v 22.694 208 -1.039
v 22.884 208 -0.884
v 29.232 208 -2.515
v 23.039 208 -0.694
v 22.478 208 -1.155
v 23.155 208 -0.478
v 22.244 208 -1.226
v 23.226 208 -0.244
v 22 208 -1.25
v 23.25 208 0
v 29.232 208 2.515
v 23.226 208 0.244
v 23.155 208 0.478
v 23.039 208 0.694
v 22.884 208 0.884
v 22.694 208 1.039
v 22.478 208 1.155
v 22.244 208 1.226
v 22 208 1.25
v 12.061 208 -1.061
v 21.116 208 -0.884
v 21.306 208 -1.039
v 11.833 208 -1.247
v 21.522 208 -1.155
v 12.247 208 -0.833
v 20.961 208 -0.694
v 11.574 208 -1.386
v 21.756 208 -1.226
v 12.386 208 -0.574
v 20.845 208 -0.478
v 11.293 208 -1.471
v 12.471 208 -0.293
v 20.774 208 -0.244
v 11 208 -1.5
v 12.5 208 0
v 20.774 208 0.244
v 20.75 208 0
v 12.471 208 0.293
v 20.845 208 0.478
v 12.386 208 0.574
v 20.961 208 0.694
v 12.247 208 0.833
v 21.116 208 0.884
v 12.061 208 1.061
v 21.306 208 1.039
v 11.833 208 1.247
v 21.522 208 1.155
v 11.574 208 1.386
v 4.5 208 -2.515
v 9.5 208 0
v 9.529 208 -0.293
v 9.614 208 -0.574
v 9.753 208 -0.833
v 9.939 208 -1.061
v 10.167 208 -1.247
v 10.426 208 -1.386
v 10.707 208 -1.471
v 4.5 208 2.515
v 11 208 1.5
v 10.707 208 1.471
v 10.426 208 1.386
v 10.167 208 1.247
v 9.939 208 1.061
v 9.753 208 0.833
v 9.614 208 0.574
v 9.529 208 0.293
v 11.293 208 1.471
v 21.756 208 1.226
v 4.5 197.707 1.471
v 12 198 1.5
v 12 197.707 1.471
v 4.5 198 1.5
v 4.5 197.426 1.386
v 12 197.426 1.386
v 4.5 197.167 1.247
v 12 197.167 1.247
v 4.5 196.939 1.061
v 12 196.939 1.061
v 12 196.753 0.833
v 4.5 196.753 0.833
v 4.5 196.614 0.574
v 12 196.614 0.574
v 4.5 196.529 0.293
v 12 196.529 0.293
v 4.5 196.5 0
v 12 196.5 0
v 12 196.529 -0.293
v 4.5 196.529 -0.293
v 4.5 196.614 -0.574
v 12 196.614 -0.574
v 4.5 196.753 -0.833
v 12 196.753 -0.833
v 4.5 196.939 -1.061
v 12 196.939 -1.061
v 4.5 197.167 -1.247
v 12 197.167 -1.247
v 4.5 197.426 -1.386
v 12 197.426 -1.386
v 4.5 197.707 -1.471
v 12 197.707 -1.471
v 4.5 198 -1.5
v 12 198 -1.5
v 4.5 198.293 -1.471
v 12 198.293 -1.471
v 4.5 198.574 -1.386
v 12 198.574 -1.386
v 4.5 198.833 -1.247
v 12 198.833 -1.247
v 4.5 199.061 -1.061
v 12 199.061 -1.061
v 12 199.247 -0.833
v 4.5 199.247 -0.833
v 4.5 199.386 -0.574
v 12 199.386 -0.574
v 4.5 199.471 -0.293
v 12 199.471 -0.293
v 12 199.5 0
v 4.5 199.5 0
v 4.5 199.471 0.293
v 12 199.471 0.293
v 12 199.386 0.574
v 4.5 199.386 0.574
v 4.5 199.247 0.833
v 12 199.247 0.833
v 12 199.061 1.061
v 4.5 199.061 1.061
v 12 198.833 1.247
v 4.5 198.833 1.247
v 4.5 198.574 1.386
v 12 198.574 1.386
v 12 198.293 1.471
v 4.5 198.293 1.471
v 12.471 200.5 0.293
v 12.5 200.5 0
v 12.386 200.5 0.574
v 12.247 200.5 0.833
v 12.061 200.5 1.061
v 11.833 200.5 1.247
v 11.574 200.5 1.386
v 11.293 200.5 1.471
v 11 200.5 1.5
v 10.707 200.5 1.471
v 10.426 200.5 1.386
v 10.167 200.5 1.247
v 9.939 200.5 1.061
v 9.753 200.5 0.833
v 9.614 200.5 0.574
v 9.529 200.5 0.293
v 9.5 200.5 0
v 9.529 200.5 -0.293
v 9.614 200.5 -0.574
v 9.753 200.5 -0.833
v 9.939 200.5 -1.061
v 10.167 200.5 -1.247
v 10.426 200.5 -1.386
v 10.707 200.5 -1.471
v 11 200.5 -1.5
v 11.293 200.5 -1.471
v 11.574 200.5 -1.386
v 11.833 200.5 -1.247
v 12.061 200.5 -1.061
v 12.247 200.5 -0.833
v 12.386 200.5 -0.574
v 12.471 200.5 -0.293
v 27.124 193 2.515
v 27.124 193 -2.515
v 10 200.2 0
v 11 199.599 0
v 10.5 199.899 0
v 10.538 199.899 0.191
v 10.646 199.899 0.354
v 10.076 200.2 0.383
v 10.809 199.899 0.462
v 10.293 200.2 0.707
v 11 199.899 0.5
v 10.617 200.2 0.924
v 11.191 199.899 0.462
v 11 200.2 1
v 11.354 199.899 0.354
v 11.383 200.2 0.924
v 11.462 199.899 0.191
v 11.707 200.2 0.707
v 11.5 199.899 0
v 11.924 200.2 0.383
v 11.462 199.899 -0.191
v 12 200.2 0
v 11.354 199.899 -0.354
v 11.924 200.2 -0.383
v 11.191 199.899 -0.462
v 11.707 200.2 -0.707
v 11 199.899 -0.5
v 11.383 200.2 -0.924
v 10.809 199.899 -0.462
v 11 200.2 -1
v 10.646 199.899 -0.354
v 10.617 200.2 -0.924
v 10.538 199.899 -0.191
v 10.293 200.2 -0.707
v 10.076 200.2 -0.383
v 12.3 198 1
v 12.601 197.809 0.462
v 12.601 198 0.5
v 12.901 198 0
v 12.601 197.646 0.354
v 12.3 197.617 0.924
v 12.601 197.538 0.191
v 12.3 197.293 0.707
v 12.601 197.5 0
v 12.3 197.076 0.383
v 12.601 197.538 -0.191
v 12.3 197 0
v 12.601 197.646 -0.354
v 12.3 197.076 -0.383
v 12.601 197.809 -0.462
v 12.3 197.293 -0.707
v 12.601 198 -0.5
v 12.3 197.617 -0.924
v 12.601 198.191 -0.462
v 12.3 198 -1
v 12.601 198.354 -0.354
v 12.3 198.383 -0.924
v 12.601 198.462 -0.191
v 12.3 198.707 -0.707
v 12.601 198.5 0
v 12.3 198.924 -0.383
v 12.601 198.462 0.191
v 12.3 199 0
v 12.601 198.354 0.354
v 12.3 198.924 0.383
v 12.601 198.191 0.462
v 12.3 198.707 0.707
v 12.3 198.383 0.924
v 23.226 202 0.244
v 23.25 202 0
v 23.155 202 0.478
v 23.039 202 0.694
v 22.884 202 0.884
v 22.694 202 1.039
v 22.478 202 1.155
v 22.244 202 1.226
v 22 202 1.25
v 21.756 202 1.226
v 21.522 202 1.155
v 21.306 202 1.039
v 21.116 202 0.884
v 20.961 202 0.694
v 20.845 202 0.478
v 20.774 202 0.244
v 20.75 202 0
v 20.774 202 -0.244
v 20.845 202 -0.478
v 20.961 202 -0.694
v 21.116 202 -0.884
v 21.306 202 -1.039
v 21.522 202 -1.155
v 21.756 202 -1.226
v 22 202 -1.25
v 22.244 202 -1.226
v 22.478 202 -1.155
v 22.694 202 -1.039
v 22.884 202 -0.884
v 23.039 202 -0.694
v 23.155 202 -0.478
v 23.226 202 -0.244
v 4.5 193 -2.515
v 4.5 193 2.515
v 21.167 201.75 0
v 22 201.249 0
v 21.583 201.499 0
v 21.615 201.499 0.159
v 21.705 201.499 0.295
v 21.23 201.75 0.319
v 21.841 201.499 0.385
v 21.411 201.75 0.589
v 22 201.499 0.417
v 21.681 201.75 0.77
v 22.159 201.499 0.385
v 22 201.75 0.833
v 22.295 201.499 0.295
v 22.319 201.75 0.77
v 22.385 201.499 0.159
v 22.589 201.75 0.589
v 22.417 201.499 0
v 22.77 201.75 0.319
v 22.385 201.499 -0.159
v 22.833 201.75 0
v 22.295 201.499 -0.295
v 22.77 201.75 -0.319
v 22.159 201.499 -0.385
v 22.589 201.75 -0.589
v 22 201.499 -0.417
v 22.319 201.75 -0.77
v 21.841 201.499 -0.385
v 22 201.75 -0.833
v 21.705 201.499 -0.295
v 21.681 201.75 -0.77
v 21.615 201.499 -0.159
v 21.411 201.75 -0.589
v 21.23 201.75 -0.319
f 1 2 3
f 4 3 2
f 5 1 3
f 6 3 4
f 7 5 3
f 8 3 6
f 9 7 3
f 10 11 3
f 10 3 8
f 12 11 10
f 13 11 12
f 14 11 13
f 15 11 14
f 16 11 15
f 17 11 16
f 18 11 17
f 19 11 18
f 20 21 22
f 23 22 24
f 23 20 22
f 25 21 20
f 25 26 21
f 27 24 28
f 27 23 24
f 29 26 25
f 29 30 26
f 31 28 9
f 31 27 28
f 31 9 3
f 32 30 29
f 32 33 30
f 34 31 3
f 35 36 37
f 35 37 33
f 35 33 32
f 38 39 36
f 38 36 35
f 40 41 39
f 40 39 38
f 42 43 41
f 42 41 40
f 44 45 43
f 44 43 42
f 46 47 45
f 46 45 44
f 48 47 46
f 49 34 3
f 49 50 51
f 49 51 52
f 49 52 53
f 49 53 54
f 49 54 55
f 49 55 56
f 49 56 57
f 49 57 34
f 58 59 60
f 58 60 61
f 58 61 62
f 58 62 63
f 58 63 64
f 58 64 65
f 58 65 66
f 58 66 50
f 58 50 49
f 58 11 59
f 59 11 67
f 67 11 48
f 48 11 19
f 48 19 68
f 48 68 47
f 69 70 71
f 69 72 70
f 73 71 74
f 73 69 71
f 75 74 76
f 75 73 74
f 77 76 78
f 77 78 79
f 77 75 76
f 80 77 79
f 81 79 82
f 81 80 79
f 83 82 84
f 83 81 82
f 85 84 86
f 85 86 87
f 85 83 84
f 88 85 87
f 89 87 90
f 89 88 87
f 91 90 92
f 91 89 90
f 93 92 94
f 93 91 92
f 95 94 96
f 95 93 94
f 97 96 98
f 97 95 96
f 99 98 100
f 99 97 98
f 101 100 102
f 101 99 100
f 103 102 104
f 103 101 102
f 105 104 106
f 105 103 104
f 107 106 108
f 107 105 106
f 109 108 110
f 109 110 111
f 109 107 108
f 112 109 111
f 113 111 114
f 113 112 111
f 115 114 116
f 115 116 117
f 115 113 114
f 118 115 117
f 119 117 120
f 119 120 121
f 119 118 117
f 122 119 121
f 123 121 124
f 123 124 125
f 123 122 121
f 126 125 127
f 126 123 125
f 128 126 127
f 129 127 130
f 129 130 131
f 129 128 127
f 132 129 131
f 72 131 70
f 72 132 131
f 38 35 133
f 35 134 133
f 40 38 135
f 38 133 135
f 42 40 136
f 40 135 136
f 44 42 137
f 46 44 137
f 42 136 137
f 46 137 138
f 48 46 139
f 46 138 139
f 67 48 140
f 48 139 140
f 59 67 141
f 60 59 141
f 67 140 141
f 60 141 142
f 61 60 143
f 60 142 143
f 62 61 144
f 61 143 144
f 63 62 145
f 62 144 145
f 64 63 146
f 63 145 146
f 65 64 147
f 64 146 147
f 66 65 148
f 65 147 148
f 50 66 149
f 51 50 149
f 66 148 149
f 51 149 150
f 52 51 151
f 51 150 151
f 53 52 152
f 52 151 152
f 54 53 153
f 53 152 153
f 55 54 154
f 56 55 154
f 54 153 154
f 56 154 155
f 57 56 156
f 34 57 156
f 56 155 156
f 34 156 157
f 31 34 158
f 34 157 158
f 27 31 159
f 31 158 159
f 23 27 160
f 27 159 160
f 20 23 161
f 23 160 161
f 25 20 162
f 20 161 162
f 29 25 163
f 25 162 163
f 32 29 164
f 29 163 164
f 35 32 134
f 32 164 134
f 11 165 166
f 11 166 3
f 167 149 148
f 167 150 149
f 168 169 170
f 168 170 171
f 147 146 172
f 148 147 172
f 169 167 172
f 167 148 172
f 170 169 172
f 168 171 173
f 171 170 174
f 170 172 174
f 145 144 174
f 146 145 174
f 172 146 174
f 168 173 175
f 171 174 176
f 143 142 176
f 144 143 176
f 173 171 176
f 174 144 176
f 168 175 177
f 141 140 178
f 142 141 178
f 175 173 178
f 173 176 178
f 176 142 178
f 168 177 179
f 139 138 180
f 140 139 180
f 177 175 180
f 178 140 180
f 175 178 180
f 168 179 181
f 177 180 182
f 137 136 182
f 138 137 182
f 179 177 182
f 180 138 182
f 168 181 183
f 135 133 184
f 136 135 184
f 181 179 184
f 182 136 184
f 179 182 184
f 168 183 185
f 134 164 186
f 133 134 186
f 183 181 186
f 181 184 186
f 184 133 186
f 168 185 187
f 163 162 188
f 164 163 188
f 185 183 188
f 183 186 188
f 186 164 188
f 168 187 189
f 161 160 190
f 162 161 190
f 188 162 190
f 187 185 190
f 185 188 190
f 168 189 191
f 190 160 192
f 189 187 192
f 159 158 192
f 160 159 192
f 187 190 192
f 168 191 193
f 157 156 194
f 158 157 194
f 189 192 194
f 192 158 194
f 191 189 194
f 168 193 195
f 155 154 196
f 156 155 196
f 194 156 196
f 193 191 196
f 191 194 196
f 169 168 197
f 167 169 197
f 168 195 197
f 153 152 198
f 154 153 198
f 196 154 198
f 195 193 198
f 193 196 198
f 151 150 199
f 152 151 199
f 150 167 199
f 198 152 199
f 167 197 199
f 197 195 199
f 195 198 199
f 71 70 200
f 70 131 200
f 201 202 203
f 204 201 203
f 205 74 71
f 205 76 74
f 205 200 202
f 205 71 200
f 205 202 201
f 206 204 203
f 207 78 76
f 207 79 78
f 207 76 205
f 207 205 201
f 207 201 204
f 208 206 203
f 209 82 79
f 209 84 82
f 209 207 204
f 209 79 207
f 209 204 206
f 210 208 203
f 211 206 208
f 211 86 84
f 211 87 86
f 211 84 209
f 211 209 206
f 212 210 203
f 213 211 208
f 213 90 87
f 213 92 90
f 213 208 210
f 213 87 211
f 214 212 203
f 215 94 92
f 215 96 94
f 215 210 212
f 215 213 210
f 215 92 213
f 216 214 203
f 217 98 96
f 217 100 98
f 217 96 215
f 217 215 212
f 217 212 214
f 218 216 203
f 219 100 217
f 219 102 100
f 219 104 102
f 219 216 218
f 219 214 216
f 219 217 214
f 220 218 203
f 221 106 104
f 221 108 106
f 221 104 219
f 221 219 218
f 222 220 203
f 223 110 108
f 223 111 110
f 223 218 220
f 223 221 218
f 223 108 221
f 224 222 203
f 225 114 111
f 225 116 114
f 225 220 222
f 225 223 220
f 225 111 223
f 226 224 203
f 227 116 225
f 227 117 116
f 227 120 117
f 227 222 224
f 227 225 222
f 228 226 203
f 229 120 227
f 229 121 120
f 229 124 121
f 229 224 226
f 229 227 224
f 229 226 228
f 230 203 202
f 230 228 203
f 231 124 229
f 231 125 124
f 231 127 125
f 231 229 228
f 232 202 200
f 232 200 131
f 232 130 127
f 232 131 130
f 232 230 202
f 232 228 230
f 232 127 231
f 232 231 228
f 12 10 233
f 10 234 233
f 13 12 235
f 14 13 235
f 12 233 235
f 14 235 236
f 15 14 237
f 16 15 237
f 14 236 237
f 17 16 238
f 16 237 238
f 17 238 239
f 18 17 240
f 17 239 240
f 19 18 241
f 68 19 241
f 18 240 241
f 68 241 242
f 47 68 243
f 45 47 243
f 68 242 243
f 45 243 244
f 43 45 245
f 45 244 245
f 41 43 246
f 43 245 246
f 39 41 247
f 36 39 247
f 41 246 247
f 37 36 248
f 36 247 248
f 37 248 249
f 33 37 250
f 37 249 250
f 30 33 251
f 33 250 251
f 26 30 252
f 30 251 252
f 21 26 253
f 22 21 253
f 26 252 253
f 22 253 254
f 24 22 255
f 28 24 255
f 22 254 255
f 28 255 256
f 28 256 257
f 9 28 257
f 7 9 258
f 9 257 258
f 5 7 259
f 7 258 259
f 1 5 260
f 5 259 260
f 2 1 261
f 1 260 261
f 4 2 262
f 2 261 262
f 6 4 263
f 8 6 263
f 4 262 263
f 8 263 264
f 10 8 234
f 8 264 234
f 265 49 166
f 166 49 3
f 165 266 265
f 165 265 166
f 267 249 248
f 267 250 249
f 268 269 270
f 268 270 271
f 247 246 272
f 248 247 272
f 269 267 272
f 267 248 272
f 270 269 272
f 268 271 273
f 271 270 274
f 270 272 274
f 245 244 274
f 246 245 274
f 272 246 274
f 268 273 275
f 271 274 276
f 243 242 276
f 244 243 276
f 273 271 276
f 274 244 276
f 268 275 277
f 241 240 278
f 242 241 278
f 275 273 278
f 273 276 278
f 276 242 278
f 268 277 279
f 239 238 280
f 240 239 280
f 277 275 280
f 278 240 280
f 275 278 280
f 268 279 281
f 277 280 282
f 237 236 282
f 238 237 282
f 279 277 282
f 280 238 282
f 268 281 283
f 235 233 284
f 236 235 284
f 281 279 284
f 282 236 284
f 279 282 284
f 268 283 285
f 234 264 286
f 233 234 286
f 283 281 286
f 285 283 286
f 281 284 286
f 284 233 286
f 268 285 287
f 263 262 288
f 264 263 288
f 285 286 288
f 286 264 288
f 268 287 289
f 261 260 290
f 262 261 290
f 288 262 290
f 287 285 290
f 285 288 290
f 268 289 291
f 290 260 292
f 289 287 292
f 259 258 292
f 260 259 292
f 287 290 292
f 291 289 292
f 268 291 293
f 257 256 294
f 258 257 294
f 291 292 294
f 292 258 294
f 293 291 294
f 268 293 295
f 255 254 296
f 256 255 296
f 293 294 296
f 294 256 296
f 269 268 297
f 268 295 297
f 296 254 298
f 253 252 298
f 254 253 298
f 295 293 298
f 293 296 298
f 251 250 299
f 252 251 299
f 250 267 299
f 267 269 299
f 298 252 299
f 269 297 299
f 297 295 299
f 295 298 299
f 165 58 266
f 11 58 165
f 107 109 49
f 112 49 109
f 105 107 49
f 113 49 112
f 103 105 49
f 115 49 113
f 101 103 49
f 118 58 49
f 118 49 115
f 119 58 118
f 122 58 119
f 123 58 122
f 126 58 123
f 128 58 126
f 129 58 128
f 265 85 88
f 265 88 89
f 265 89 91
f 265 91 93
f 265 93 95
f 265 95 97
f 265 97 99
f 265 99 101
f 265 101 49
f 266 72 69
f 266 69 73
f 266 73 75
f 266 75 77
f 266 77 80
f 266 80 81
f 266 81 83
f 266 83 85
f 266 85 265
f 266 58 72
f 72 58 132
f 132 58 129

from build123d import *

# Parameters (mm, degrees)
EXTRUDE1_DEPTH                 = 2.515
M3X0_5_TAPPED_HOLE2_AT_2_COUNT = 2
M3X0_5_TAPPED_HOLE2_AT_2_PITCH = 37
M3X0_5_TAPPED_HOLE2_AT_3_COUNT = 2
M3X0_5_TAPPED_HOLE2_AT_3_PITCH = 74
M3X0_5_TAPPED_HOLE2_AT_4_COUNT = 2
M3X0_5_TAPPED_HOLE2_AT_4_PITCH = 111
M3X0_5_TAPPED_HOLE2_AT_5_COUNT = 2
M3X0_5_TAPPED_HOLE2_AT_5_PITCH = 148
CUT_EXTRUDE1_DEPTH             = 6.03
M3X0_5_TAPPED_HOLE1_D          = 3
M3X0_5_TAPPED_HOLE1_DEPTH      = 7.5
M3X0_5_TAPPED_HOLE1_TIP        = 0.901290929
F_2_5_2_5_DIAMETER_HOLE1_D     = 2.5
F_2_5_2_5_DIAMETER_HOLE1_DEPTH = 6
F_2_5_2_5_DIAMETER_HOLE1_TIP   = 0.751075774


with BuildPart() as part:
    # Sketch1 → Extrude1 (new body, symmetric)
    with BuildSketch(Plane.XY):
        with BuildLine():
            Line((29.232493618, 208), (4.5, 208))
            Line((4.5, 208), (4.5, 37.873672337))
            ThreePointArc((4.5, 37.873672337), (38.14007153, 0), (4.5, -37.873672337))
            Line((4.5, -37.873672337), (4.5, -208))
            Line((4.5, -208), (29.232493618, -208))
            Line((29.232493618, -208), (12, -85.384436669))
            Line((12, -85.384436669), (12, -60))
            ThreePointArc((12, -60), (14.850141486, -49.710084891), (22.588235294, -42.352941176))
            ThreePointArc((22.588235294, -42.352941176), (48, 0), (22.588235294, 42.352941176))
            ThreePointArc((22.588235294, 42.352941176), (14.850141486, 49.710084891), (12, 60))
            Line((12, 60), (12, 85.384436669))
            Line((12, 85.384436669), (29.232493618, 208))
        make_face()
    extrude(amount=EXTRUDE1_DEPTH, both=True)

    # Sketch32 → M3x0.5 Tapped Hole2 (revolve, cut)
    with BuildSketch(Plane(origin=(4.5, 198, 0), x_dir=(0, 0, 1), z_dir=(0, 1, 0))):
        Polygon((0, 0), (0, 8.401290929), (1.5, 7.5), (1.5, 0), align=None)
    m3x0_5_tapped_hole2 = revolve(axis=Axis((-1.85, 198, 0), (1, 0, 0)), mode=Mode.SUBTRACT)

    # M3x0.5 Tapped Hole2 at 2: M3x0.5 Tapped Hole2 ×2
    with Locations(*[(0, -i * M3X0_5_TAPPED_HOLE2_AT_2_PITCH, 0) for i in range(1, M3X0_5_TAPPED_HOLE2_AT_2_COUNT)]):
        add(m3x0_5_tapped_hole2, mode=Mode.SUBTRACT)

    # M3x0.5 Tapped Hole2 at 3: M3x0.5 Tapped Hole2 ×2
    with Locations(*[(0, -i * M3X0_5_TAPPED_HOLE2_AT_3_PITCH, 0) for i in range(1, M3X0_5_TAPPED_HOLE2_AT_3_COUNT)]):
        add(m3x0_5_tapped_hole2, mode=Mode.SUBTRACT)

    # M3x0.5 Tapped Hole2 at 4: M3x0.5 Tapped Hole2 ×2
    with Locations(*[(0, -i * M3X0_5_TAPPED_HOLE2_AT_4_PITCH, 0) for i in range(1, M3X0_5_TAPPED_HOLE2_AT_4_COUNT)]):
        add(m3x0_5_tapped_hole2, mode=Mode.SUBTRACT)

    # M3x0.5 Tapped Hole2 at 5: M3x0.5 Tapped Hole2 ×2
    with Locations(*[(0, -i * M3X0_5_TAPPED_HOLE2_AT_5_PITCH, 0) for i in range(1, M3X0_5_TAPPED_HOLE2_AT_5_COUNT)]):
        add(m3x0_5_tapped_hole2, mode=Mode.SUBTRACT)

    # Mirror2: M3x0.5 Tapped Hole2 across plane
    add(m3x0_5_tapped_hole2.mirror(Plane.ZX), mode=Mode.SUBTRACT)

    # Mirror2 copy 1 sketch → Mirror2 copy 1 (revolve, cut)
    with BuildSketch(Plane(origin=(4.5, -161, 0), x_dir=(0, 0, 1), z_dir=(0, -1, 0))):
        Polygon((0, 0), (0, -8.401290929), (1.5, -7.5), (1.5, 0), align=None)
    revolve(axis=Axis((-1.85, -161, 0), (-1, 0, 0)), mode=Mode.SUBTRACT)

    # Mirror2 copy 2 sketch → Mirror2 copy 2 (revolve, cut)
    with BuildSketch(Plane(origin=(4.5, -124, 0), x_dir=(0, 0, 1), z_dir=(0, -1, 0))):
        Polygon((0, 0), (0, -8.401290929), (1.5, -7.5), (1.5, 0), align=None)
    revolve(axis=Axis((-1.85, -124, 0), (-1, 0, 0)), mode=Mode.SUBTRACT)

    # Mirror2 copy 3 sketch → Mirror2 copy 3 (revolve, cut)
    with BuildSketch(Plane(origin=(4.5, -87, 0), x_dir=(0, 0, 1), z_dir=(0, -1, 0))):
        Polygon((0, 0), (0, -8.401290929), (1.5, -7.5), (1.5, 0), align=None)
    revolve(axis=Axis((-1.85, -87, 0), (-1, 0, 0)), mode=Mode.SUBTRACT)

    # Mirror2 copy 4 sketch → Mirror2 copy 4 (revolve, cut)
    with BuildSketch(Plane(origin=(4.5, -50, 0), x_dir=(0, 0, 1), z_dir=(0, -1, 0))):
        Polygon((0, 0), (0, -8.401290929), (1.5, -7.5), (1.5, 0), align=None)
    revolve(axis=Axis((-1.85, -50, 0), (-1, 0, 0)), mode=Mode.SUBTRACT)

    # Sketch36 → Cut-Extrude1 (cut, through all)
    with BuildSketch(Plane.XY.offset(2.515)):
        with BuildLine():
            Line((4.5, 193), (27.124381098, 193))
            Line((27.124381098, 193), (12, 85.384436669))
            Line((12, 85.384436669), (12, 60))
            ThreePointArc((12, 60), (14.850141486, 49.710084891), (22.588235294, 42.352941176))
            ThreePointArc((22.588235294, 42.352941176), (48, 0), (22.588235294, -42.352941176))
            ThreePointArc((22.588235294, -42.352941176), (14.850141486, -49.710084891), (12, -60))
            Line((12, -60), (12, -85.384436669))
            Line((12, -85.384436669), (29.232493618, -208))
            Line((29.232493618, -208), (4.5, -208))
            Line((4.5, -208), (4.5, -37.873672337))
            ThreePointArc((4.5, -37.873672337), (38.14007153, 0), (4.5, 37.873672337))
            Line((4.5, 37.873672337), (4.5, 193))
        make_face()
    extrude(amount=-CUT_EXTRUDE1_DEPTH, mode=Mode.SUBTRACT)

    # M3x0.5 Tapped Hole1
    with Locations(Plane(origin=(0, 208, 0), x_dir=(-1, 0, 0), z_dir=(0, 1, 0))):
        with Locations((-11, 0)):
            Hole(M3X0_5_TAPPED_HOLE1_D / 2, depth=M3X0_5_TAPPED_HOLE1_DEPTH)
            with Locations((0, 0, -(M3X0_5_TAPPED_HOLE1_DEPTH + M3X0_5_TAPPED_HOLE1_TIP / 2))):  # 118° drill point
                Cone(0, M3X0_5_TAPPED_HOLE1_D / 2, M3X0_5_TAPPED_HOLE1_TIP, mode=Mode.SUBTRACT)

    # 2.5 _2.5_ Diameter Hole1
    with Locations(Plane(origin=(0, 208, 0), x_dir=(-1, 0, 0), z_dir=(0, 1, 0))):
        with Locations((-22, 0)):
            Hole(F_2_5_2_5_DIAMETER_HOLE1_D / 2, depth=F_2_5_2_5_DIAMETER_HOLE1_DEPTH)
            with Locations((0, 0, -(F_2_5_2_5_DIAMETER_HOLE1_DEPTH + F_2_5_2_5_DIAMETER_HOLE1_TIP / 2))):  # 118° drill point
                Cone(0, F_2_5_2_5_DIAMETER_HOLE1_D / 2, F_2_5_2_5_DIAMETER_HOLE1_TIP, mode=Mode.SUBTRACT)


solid = part.part
